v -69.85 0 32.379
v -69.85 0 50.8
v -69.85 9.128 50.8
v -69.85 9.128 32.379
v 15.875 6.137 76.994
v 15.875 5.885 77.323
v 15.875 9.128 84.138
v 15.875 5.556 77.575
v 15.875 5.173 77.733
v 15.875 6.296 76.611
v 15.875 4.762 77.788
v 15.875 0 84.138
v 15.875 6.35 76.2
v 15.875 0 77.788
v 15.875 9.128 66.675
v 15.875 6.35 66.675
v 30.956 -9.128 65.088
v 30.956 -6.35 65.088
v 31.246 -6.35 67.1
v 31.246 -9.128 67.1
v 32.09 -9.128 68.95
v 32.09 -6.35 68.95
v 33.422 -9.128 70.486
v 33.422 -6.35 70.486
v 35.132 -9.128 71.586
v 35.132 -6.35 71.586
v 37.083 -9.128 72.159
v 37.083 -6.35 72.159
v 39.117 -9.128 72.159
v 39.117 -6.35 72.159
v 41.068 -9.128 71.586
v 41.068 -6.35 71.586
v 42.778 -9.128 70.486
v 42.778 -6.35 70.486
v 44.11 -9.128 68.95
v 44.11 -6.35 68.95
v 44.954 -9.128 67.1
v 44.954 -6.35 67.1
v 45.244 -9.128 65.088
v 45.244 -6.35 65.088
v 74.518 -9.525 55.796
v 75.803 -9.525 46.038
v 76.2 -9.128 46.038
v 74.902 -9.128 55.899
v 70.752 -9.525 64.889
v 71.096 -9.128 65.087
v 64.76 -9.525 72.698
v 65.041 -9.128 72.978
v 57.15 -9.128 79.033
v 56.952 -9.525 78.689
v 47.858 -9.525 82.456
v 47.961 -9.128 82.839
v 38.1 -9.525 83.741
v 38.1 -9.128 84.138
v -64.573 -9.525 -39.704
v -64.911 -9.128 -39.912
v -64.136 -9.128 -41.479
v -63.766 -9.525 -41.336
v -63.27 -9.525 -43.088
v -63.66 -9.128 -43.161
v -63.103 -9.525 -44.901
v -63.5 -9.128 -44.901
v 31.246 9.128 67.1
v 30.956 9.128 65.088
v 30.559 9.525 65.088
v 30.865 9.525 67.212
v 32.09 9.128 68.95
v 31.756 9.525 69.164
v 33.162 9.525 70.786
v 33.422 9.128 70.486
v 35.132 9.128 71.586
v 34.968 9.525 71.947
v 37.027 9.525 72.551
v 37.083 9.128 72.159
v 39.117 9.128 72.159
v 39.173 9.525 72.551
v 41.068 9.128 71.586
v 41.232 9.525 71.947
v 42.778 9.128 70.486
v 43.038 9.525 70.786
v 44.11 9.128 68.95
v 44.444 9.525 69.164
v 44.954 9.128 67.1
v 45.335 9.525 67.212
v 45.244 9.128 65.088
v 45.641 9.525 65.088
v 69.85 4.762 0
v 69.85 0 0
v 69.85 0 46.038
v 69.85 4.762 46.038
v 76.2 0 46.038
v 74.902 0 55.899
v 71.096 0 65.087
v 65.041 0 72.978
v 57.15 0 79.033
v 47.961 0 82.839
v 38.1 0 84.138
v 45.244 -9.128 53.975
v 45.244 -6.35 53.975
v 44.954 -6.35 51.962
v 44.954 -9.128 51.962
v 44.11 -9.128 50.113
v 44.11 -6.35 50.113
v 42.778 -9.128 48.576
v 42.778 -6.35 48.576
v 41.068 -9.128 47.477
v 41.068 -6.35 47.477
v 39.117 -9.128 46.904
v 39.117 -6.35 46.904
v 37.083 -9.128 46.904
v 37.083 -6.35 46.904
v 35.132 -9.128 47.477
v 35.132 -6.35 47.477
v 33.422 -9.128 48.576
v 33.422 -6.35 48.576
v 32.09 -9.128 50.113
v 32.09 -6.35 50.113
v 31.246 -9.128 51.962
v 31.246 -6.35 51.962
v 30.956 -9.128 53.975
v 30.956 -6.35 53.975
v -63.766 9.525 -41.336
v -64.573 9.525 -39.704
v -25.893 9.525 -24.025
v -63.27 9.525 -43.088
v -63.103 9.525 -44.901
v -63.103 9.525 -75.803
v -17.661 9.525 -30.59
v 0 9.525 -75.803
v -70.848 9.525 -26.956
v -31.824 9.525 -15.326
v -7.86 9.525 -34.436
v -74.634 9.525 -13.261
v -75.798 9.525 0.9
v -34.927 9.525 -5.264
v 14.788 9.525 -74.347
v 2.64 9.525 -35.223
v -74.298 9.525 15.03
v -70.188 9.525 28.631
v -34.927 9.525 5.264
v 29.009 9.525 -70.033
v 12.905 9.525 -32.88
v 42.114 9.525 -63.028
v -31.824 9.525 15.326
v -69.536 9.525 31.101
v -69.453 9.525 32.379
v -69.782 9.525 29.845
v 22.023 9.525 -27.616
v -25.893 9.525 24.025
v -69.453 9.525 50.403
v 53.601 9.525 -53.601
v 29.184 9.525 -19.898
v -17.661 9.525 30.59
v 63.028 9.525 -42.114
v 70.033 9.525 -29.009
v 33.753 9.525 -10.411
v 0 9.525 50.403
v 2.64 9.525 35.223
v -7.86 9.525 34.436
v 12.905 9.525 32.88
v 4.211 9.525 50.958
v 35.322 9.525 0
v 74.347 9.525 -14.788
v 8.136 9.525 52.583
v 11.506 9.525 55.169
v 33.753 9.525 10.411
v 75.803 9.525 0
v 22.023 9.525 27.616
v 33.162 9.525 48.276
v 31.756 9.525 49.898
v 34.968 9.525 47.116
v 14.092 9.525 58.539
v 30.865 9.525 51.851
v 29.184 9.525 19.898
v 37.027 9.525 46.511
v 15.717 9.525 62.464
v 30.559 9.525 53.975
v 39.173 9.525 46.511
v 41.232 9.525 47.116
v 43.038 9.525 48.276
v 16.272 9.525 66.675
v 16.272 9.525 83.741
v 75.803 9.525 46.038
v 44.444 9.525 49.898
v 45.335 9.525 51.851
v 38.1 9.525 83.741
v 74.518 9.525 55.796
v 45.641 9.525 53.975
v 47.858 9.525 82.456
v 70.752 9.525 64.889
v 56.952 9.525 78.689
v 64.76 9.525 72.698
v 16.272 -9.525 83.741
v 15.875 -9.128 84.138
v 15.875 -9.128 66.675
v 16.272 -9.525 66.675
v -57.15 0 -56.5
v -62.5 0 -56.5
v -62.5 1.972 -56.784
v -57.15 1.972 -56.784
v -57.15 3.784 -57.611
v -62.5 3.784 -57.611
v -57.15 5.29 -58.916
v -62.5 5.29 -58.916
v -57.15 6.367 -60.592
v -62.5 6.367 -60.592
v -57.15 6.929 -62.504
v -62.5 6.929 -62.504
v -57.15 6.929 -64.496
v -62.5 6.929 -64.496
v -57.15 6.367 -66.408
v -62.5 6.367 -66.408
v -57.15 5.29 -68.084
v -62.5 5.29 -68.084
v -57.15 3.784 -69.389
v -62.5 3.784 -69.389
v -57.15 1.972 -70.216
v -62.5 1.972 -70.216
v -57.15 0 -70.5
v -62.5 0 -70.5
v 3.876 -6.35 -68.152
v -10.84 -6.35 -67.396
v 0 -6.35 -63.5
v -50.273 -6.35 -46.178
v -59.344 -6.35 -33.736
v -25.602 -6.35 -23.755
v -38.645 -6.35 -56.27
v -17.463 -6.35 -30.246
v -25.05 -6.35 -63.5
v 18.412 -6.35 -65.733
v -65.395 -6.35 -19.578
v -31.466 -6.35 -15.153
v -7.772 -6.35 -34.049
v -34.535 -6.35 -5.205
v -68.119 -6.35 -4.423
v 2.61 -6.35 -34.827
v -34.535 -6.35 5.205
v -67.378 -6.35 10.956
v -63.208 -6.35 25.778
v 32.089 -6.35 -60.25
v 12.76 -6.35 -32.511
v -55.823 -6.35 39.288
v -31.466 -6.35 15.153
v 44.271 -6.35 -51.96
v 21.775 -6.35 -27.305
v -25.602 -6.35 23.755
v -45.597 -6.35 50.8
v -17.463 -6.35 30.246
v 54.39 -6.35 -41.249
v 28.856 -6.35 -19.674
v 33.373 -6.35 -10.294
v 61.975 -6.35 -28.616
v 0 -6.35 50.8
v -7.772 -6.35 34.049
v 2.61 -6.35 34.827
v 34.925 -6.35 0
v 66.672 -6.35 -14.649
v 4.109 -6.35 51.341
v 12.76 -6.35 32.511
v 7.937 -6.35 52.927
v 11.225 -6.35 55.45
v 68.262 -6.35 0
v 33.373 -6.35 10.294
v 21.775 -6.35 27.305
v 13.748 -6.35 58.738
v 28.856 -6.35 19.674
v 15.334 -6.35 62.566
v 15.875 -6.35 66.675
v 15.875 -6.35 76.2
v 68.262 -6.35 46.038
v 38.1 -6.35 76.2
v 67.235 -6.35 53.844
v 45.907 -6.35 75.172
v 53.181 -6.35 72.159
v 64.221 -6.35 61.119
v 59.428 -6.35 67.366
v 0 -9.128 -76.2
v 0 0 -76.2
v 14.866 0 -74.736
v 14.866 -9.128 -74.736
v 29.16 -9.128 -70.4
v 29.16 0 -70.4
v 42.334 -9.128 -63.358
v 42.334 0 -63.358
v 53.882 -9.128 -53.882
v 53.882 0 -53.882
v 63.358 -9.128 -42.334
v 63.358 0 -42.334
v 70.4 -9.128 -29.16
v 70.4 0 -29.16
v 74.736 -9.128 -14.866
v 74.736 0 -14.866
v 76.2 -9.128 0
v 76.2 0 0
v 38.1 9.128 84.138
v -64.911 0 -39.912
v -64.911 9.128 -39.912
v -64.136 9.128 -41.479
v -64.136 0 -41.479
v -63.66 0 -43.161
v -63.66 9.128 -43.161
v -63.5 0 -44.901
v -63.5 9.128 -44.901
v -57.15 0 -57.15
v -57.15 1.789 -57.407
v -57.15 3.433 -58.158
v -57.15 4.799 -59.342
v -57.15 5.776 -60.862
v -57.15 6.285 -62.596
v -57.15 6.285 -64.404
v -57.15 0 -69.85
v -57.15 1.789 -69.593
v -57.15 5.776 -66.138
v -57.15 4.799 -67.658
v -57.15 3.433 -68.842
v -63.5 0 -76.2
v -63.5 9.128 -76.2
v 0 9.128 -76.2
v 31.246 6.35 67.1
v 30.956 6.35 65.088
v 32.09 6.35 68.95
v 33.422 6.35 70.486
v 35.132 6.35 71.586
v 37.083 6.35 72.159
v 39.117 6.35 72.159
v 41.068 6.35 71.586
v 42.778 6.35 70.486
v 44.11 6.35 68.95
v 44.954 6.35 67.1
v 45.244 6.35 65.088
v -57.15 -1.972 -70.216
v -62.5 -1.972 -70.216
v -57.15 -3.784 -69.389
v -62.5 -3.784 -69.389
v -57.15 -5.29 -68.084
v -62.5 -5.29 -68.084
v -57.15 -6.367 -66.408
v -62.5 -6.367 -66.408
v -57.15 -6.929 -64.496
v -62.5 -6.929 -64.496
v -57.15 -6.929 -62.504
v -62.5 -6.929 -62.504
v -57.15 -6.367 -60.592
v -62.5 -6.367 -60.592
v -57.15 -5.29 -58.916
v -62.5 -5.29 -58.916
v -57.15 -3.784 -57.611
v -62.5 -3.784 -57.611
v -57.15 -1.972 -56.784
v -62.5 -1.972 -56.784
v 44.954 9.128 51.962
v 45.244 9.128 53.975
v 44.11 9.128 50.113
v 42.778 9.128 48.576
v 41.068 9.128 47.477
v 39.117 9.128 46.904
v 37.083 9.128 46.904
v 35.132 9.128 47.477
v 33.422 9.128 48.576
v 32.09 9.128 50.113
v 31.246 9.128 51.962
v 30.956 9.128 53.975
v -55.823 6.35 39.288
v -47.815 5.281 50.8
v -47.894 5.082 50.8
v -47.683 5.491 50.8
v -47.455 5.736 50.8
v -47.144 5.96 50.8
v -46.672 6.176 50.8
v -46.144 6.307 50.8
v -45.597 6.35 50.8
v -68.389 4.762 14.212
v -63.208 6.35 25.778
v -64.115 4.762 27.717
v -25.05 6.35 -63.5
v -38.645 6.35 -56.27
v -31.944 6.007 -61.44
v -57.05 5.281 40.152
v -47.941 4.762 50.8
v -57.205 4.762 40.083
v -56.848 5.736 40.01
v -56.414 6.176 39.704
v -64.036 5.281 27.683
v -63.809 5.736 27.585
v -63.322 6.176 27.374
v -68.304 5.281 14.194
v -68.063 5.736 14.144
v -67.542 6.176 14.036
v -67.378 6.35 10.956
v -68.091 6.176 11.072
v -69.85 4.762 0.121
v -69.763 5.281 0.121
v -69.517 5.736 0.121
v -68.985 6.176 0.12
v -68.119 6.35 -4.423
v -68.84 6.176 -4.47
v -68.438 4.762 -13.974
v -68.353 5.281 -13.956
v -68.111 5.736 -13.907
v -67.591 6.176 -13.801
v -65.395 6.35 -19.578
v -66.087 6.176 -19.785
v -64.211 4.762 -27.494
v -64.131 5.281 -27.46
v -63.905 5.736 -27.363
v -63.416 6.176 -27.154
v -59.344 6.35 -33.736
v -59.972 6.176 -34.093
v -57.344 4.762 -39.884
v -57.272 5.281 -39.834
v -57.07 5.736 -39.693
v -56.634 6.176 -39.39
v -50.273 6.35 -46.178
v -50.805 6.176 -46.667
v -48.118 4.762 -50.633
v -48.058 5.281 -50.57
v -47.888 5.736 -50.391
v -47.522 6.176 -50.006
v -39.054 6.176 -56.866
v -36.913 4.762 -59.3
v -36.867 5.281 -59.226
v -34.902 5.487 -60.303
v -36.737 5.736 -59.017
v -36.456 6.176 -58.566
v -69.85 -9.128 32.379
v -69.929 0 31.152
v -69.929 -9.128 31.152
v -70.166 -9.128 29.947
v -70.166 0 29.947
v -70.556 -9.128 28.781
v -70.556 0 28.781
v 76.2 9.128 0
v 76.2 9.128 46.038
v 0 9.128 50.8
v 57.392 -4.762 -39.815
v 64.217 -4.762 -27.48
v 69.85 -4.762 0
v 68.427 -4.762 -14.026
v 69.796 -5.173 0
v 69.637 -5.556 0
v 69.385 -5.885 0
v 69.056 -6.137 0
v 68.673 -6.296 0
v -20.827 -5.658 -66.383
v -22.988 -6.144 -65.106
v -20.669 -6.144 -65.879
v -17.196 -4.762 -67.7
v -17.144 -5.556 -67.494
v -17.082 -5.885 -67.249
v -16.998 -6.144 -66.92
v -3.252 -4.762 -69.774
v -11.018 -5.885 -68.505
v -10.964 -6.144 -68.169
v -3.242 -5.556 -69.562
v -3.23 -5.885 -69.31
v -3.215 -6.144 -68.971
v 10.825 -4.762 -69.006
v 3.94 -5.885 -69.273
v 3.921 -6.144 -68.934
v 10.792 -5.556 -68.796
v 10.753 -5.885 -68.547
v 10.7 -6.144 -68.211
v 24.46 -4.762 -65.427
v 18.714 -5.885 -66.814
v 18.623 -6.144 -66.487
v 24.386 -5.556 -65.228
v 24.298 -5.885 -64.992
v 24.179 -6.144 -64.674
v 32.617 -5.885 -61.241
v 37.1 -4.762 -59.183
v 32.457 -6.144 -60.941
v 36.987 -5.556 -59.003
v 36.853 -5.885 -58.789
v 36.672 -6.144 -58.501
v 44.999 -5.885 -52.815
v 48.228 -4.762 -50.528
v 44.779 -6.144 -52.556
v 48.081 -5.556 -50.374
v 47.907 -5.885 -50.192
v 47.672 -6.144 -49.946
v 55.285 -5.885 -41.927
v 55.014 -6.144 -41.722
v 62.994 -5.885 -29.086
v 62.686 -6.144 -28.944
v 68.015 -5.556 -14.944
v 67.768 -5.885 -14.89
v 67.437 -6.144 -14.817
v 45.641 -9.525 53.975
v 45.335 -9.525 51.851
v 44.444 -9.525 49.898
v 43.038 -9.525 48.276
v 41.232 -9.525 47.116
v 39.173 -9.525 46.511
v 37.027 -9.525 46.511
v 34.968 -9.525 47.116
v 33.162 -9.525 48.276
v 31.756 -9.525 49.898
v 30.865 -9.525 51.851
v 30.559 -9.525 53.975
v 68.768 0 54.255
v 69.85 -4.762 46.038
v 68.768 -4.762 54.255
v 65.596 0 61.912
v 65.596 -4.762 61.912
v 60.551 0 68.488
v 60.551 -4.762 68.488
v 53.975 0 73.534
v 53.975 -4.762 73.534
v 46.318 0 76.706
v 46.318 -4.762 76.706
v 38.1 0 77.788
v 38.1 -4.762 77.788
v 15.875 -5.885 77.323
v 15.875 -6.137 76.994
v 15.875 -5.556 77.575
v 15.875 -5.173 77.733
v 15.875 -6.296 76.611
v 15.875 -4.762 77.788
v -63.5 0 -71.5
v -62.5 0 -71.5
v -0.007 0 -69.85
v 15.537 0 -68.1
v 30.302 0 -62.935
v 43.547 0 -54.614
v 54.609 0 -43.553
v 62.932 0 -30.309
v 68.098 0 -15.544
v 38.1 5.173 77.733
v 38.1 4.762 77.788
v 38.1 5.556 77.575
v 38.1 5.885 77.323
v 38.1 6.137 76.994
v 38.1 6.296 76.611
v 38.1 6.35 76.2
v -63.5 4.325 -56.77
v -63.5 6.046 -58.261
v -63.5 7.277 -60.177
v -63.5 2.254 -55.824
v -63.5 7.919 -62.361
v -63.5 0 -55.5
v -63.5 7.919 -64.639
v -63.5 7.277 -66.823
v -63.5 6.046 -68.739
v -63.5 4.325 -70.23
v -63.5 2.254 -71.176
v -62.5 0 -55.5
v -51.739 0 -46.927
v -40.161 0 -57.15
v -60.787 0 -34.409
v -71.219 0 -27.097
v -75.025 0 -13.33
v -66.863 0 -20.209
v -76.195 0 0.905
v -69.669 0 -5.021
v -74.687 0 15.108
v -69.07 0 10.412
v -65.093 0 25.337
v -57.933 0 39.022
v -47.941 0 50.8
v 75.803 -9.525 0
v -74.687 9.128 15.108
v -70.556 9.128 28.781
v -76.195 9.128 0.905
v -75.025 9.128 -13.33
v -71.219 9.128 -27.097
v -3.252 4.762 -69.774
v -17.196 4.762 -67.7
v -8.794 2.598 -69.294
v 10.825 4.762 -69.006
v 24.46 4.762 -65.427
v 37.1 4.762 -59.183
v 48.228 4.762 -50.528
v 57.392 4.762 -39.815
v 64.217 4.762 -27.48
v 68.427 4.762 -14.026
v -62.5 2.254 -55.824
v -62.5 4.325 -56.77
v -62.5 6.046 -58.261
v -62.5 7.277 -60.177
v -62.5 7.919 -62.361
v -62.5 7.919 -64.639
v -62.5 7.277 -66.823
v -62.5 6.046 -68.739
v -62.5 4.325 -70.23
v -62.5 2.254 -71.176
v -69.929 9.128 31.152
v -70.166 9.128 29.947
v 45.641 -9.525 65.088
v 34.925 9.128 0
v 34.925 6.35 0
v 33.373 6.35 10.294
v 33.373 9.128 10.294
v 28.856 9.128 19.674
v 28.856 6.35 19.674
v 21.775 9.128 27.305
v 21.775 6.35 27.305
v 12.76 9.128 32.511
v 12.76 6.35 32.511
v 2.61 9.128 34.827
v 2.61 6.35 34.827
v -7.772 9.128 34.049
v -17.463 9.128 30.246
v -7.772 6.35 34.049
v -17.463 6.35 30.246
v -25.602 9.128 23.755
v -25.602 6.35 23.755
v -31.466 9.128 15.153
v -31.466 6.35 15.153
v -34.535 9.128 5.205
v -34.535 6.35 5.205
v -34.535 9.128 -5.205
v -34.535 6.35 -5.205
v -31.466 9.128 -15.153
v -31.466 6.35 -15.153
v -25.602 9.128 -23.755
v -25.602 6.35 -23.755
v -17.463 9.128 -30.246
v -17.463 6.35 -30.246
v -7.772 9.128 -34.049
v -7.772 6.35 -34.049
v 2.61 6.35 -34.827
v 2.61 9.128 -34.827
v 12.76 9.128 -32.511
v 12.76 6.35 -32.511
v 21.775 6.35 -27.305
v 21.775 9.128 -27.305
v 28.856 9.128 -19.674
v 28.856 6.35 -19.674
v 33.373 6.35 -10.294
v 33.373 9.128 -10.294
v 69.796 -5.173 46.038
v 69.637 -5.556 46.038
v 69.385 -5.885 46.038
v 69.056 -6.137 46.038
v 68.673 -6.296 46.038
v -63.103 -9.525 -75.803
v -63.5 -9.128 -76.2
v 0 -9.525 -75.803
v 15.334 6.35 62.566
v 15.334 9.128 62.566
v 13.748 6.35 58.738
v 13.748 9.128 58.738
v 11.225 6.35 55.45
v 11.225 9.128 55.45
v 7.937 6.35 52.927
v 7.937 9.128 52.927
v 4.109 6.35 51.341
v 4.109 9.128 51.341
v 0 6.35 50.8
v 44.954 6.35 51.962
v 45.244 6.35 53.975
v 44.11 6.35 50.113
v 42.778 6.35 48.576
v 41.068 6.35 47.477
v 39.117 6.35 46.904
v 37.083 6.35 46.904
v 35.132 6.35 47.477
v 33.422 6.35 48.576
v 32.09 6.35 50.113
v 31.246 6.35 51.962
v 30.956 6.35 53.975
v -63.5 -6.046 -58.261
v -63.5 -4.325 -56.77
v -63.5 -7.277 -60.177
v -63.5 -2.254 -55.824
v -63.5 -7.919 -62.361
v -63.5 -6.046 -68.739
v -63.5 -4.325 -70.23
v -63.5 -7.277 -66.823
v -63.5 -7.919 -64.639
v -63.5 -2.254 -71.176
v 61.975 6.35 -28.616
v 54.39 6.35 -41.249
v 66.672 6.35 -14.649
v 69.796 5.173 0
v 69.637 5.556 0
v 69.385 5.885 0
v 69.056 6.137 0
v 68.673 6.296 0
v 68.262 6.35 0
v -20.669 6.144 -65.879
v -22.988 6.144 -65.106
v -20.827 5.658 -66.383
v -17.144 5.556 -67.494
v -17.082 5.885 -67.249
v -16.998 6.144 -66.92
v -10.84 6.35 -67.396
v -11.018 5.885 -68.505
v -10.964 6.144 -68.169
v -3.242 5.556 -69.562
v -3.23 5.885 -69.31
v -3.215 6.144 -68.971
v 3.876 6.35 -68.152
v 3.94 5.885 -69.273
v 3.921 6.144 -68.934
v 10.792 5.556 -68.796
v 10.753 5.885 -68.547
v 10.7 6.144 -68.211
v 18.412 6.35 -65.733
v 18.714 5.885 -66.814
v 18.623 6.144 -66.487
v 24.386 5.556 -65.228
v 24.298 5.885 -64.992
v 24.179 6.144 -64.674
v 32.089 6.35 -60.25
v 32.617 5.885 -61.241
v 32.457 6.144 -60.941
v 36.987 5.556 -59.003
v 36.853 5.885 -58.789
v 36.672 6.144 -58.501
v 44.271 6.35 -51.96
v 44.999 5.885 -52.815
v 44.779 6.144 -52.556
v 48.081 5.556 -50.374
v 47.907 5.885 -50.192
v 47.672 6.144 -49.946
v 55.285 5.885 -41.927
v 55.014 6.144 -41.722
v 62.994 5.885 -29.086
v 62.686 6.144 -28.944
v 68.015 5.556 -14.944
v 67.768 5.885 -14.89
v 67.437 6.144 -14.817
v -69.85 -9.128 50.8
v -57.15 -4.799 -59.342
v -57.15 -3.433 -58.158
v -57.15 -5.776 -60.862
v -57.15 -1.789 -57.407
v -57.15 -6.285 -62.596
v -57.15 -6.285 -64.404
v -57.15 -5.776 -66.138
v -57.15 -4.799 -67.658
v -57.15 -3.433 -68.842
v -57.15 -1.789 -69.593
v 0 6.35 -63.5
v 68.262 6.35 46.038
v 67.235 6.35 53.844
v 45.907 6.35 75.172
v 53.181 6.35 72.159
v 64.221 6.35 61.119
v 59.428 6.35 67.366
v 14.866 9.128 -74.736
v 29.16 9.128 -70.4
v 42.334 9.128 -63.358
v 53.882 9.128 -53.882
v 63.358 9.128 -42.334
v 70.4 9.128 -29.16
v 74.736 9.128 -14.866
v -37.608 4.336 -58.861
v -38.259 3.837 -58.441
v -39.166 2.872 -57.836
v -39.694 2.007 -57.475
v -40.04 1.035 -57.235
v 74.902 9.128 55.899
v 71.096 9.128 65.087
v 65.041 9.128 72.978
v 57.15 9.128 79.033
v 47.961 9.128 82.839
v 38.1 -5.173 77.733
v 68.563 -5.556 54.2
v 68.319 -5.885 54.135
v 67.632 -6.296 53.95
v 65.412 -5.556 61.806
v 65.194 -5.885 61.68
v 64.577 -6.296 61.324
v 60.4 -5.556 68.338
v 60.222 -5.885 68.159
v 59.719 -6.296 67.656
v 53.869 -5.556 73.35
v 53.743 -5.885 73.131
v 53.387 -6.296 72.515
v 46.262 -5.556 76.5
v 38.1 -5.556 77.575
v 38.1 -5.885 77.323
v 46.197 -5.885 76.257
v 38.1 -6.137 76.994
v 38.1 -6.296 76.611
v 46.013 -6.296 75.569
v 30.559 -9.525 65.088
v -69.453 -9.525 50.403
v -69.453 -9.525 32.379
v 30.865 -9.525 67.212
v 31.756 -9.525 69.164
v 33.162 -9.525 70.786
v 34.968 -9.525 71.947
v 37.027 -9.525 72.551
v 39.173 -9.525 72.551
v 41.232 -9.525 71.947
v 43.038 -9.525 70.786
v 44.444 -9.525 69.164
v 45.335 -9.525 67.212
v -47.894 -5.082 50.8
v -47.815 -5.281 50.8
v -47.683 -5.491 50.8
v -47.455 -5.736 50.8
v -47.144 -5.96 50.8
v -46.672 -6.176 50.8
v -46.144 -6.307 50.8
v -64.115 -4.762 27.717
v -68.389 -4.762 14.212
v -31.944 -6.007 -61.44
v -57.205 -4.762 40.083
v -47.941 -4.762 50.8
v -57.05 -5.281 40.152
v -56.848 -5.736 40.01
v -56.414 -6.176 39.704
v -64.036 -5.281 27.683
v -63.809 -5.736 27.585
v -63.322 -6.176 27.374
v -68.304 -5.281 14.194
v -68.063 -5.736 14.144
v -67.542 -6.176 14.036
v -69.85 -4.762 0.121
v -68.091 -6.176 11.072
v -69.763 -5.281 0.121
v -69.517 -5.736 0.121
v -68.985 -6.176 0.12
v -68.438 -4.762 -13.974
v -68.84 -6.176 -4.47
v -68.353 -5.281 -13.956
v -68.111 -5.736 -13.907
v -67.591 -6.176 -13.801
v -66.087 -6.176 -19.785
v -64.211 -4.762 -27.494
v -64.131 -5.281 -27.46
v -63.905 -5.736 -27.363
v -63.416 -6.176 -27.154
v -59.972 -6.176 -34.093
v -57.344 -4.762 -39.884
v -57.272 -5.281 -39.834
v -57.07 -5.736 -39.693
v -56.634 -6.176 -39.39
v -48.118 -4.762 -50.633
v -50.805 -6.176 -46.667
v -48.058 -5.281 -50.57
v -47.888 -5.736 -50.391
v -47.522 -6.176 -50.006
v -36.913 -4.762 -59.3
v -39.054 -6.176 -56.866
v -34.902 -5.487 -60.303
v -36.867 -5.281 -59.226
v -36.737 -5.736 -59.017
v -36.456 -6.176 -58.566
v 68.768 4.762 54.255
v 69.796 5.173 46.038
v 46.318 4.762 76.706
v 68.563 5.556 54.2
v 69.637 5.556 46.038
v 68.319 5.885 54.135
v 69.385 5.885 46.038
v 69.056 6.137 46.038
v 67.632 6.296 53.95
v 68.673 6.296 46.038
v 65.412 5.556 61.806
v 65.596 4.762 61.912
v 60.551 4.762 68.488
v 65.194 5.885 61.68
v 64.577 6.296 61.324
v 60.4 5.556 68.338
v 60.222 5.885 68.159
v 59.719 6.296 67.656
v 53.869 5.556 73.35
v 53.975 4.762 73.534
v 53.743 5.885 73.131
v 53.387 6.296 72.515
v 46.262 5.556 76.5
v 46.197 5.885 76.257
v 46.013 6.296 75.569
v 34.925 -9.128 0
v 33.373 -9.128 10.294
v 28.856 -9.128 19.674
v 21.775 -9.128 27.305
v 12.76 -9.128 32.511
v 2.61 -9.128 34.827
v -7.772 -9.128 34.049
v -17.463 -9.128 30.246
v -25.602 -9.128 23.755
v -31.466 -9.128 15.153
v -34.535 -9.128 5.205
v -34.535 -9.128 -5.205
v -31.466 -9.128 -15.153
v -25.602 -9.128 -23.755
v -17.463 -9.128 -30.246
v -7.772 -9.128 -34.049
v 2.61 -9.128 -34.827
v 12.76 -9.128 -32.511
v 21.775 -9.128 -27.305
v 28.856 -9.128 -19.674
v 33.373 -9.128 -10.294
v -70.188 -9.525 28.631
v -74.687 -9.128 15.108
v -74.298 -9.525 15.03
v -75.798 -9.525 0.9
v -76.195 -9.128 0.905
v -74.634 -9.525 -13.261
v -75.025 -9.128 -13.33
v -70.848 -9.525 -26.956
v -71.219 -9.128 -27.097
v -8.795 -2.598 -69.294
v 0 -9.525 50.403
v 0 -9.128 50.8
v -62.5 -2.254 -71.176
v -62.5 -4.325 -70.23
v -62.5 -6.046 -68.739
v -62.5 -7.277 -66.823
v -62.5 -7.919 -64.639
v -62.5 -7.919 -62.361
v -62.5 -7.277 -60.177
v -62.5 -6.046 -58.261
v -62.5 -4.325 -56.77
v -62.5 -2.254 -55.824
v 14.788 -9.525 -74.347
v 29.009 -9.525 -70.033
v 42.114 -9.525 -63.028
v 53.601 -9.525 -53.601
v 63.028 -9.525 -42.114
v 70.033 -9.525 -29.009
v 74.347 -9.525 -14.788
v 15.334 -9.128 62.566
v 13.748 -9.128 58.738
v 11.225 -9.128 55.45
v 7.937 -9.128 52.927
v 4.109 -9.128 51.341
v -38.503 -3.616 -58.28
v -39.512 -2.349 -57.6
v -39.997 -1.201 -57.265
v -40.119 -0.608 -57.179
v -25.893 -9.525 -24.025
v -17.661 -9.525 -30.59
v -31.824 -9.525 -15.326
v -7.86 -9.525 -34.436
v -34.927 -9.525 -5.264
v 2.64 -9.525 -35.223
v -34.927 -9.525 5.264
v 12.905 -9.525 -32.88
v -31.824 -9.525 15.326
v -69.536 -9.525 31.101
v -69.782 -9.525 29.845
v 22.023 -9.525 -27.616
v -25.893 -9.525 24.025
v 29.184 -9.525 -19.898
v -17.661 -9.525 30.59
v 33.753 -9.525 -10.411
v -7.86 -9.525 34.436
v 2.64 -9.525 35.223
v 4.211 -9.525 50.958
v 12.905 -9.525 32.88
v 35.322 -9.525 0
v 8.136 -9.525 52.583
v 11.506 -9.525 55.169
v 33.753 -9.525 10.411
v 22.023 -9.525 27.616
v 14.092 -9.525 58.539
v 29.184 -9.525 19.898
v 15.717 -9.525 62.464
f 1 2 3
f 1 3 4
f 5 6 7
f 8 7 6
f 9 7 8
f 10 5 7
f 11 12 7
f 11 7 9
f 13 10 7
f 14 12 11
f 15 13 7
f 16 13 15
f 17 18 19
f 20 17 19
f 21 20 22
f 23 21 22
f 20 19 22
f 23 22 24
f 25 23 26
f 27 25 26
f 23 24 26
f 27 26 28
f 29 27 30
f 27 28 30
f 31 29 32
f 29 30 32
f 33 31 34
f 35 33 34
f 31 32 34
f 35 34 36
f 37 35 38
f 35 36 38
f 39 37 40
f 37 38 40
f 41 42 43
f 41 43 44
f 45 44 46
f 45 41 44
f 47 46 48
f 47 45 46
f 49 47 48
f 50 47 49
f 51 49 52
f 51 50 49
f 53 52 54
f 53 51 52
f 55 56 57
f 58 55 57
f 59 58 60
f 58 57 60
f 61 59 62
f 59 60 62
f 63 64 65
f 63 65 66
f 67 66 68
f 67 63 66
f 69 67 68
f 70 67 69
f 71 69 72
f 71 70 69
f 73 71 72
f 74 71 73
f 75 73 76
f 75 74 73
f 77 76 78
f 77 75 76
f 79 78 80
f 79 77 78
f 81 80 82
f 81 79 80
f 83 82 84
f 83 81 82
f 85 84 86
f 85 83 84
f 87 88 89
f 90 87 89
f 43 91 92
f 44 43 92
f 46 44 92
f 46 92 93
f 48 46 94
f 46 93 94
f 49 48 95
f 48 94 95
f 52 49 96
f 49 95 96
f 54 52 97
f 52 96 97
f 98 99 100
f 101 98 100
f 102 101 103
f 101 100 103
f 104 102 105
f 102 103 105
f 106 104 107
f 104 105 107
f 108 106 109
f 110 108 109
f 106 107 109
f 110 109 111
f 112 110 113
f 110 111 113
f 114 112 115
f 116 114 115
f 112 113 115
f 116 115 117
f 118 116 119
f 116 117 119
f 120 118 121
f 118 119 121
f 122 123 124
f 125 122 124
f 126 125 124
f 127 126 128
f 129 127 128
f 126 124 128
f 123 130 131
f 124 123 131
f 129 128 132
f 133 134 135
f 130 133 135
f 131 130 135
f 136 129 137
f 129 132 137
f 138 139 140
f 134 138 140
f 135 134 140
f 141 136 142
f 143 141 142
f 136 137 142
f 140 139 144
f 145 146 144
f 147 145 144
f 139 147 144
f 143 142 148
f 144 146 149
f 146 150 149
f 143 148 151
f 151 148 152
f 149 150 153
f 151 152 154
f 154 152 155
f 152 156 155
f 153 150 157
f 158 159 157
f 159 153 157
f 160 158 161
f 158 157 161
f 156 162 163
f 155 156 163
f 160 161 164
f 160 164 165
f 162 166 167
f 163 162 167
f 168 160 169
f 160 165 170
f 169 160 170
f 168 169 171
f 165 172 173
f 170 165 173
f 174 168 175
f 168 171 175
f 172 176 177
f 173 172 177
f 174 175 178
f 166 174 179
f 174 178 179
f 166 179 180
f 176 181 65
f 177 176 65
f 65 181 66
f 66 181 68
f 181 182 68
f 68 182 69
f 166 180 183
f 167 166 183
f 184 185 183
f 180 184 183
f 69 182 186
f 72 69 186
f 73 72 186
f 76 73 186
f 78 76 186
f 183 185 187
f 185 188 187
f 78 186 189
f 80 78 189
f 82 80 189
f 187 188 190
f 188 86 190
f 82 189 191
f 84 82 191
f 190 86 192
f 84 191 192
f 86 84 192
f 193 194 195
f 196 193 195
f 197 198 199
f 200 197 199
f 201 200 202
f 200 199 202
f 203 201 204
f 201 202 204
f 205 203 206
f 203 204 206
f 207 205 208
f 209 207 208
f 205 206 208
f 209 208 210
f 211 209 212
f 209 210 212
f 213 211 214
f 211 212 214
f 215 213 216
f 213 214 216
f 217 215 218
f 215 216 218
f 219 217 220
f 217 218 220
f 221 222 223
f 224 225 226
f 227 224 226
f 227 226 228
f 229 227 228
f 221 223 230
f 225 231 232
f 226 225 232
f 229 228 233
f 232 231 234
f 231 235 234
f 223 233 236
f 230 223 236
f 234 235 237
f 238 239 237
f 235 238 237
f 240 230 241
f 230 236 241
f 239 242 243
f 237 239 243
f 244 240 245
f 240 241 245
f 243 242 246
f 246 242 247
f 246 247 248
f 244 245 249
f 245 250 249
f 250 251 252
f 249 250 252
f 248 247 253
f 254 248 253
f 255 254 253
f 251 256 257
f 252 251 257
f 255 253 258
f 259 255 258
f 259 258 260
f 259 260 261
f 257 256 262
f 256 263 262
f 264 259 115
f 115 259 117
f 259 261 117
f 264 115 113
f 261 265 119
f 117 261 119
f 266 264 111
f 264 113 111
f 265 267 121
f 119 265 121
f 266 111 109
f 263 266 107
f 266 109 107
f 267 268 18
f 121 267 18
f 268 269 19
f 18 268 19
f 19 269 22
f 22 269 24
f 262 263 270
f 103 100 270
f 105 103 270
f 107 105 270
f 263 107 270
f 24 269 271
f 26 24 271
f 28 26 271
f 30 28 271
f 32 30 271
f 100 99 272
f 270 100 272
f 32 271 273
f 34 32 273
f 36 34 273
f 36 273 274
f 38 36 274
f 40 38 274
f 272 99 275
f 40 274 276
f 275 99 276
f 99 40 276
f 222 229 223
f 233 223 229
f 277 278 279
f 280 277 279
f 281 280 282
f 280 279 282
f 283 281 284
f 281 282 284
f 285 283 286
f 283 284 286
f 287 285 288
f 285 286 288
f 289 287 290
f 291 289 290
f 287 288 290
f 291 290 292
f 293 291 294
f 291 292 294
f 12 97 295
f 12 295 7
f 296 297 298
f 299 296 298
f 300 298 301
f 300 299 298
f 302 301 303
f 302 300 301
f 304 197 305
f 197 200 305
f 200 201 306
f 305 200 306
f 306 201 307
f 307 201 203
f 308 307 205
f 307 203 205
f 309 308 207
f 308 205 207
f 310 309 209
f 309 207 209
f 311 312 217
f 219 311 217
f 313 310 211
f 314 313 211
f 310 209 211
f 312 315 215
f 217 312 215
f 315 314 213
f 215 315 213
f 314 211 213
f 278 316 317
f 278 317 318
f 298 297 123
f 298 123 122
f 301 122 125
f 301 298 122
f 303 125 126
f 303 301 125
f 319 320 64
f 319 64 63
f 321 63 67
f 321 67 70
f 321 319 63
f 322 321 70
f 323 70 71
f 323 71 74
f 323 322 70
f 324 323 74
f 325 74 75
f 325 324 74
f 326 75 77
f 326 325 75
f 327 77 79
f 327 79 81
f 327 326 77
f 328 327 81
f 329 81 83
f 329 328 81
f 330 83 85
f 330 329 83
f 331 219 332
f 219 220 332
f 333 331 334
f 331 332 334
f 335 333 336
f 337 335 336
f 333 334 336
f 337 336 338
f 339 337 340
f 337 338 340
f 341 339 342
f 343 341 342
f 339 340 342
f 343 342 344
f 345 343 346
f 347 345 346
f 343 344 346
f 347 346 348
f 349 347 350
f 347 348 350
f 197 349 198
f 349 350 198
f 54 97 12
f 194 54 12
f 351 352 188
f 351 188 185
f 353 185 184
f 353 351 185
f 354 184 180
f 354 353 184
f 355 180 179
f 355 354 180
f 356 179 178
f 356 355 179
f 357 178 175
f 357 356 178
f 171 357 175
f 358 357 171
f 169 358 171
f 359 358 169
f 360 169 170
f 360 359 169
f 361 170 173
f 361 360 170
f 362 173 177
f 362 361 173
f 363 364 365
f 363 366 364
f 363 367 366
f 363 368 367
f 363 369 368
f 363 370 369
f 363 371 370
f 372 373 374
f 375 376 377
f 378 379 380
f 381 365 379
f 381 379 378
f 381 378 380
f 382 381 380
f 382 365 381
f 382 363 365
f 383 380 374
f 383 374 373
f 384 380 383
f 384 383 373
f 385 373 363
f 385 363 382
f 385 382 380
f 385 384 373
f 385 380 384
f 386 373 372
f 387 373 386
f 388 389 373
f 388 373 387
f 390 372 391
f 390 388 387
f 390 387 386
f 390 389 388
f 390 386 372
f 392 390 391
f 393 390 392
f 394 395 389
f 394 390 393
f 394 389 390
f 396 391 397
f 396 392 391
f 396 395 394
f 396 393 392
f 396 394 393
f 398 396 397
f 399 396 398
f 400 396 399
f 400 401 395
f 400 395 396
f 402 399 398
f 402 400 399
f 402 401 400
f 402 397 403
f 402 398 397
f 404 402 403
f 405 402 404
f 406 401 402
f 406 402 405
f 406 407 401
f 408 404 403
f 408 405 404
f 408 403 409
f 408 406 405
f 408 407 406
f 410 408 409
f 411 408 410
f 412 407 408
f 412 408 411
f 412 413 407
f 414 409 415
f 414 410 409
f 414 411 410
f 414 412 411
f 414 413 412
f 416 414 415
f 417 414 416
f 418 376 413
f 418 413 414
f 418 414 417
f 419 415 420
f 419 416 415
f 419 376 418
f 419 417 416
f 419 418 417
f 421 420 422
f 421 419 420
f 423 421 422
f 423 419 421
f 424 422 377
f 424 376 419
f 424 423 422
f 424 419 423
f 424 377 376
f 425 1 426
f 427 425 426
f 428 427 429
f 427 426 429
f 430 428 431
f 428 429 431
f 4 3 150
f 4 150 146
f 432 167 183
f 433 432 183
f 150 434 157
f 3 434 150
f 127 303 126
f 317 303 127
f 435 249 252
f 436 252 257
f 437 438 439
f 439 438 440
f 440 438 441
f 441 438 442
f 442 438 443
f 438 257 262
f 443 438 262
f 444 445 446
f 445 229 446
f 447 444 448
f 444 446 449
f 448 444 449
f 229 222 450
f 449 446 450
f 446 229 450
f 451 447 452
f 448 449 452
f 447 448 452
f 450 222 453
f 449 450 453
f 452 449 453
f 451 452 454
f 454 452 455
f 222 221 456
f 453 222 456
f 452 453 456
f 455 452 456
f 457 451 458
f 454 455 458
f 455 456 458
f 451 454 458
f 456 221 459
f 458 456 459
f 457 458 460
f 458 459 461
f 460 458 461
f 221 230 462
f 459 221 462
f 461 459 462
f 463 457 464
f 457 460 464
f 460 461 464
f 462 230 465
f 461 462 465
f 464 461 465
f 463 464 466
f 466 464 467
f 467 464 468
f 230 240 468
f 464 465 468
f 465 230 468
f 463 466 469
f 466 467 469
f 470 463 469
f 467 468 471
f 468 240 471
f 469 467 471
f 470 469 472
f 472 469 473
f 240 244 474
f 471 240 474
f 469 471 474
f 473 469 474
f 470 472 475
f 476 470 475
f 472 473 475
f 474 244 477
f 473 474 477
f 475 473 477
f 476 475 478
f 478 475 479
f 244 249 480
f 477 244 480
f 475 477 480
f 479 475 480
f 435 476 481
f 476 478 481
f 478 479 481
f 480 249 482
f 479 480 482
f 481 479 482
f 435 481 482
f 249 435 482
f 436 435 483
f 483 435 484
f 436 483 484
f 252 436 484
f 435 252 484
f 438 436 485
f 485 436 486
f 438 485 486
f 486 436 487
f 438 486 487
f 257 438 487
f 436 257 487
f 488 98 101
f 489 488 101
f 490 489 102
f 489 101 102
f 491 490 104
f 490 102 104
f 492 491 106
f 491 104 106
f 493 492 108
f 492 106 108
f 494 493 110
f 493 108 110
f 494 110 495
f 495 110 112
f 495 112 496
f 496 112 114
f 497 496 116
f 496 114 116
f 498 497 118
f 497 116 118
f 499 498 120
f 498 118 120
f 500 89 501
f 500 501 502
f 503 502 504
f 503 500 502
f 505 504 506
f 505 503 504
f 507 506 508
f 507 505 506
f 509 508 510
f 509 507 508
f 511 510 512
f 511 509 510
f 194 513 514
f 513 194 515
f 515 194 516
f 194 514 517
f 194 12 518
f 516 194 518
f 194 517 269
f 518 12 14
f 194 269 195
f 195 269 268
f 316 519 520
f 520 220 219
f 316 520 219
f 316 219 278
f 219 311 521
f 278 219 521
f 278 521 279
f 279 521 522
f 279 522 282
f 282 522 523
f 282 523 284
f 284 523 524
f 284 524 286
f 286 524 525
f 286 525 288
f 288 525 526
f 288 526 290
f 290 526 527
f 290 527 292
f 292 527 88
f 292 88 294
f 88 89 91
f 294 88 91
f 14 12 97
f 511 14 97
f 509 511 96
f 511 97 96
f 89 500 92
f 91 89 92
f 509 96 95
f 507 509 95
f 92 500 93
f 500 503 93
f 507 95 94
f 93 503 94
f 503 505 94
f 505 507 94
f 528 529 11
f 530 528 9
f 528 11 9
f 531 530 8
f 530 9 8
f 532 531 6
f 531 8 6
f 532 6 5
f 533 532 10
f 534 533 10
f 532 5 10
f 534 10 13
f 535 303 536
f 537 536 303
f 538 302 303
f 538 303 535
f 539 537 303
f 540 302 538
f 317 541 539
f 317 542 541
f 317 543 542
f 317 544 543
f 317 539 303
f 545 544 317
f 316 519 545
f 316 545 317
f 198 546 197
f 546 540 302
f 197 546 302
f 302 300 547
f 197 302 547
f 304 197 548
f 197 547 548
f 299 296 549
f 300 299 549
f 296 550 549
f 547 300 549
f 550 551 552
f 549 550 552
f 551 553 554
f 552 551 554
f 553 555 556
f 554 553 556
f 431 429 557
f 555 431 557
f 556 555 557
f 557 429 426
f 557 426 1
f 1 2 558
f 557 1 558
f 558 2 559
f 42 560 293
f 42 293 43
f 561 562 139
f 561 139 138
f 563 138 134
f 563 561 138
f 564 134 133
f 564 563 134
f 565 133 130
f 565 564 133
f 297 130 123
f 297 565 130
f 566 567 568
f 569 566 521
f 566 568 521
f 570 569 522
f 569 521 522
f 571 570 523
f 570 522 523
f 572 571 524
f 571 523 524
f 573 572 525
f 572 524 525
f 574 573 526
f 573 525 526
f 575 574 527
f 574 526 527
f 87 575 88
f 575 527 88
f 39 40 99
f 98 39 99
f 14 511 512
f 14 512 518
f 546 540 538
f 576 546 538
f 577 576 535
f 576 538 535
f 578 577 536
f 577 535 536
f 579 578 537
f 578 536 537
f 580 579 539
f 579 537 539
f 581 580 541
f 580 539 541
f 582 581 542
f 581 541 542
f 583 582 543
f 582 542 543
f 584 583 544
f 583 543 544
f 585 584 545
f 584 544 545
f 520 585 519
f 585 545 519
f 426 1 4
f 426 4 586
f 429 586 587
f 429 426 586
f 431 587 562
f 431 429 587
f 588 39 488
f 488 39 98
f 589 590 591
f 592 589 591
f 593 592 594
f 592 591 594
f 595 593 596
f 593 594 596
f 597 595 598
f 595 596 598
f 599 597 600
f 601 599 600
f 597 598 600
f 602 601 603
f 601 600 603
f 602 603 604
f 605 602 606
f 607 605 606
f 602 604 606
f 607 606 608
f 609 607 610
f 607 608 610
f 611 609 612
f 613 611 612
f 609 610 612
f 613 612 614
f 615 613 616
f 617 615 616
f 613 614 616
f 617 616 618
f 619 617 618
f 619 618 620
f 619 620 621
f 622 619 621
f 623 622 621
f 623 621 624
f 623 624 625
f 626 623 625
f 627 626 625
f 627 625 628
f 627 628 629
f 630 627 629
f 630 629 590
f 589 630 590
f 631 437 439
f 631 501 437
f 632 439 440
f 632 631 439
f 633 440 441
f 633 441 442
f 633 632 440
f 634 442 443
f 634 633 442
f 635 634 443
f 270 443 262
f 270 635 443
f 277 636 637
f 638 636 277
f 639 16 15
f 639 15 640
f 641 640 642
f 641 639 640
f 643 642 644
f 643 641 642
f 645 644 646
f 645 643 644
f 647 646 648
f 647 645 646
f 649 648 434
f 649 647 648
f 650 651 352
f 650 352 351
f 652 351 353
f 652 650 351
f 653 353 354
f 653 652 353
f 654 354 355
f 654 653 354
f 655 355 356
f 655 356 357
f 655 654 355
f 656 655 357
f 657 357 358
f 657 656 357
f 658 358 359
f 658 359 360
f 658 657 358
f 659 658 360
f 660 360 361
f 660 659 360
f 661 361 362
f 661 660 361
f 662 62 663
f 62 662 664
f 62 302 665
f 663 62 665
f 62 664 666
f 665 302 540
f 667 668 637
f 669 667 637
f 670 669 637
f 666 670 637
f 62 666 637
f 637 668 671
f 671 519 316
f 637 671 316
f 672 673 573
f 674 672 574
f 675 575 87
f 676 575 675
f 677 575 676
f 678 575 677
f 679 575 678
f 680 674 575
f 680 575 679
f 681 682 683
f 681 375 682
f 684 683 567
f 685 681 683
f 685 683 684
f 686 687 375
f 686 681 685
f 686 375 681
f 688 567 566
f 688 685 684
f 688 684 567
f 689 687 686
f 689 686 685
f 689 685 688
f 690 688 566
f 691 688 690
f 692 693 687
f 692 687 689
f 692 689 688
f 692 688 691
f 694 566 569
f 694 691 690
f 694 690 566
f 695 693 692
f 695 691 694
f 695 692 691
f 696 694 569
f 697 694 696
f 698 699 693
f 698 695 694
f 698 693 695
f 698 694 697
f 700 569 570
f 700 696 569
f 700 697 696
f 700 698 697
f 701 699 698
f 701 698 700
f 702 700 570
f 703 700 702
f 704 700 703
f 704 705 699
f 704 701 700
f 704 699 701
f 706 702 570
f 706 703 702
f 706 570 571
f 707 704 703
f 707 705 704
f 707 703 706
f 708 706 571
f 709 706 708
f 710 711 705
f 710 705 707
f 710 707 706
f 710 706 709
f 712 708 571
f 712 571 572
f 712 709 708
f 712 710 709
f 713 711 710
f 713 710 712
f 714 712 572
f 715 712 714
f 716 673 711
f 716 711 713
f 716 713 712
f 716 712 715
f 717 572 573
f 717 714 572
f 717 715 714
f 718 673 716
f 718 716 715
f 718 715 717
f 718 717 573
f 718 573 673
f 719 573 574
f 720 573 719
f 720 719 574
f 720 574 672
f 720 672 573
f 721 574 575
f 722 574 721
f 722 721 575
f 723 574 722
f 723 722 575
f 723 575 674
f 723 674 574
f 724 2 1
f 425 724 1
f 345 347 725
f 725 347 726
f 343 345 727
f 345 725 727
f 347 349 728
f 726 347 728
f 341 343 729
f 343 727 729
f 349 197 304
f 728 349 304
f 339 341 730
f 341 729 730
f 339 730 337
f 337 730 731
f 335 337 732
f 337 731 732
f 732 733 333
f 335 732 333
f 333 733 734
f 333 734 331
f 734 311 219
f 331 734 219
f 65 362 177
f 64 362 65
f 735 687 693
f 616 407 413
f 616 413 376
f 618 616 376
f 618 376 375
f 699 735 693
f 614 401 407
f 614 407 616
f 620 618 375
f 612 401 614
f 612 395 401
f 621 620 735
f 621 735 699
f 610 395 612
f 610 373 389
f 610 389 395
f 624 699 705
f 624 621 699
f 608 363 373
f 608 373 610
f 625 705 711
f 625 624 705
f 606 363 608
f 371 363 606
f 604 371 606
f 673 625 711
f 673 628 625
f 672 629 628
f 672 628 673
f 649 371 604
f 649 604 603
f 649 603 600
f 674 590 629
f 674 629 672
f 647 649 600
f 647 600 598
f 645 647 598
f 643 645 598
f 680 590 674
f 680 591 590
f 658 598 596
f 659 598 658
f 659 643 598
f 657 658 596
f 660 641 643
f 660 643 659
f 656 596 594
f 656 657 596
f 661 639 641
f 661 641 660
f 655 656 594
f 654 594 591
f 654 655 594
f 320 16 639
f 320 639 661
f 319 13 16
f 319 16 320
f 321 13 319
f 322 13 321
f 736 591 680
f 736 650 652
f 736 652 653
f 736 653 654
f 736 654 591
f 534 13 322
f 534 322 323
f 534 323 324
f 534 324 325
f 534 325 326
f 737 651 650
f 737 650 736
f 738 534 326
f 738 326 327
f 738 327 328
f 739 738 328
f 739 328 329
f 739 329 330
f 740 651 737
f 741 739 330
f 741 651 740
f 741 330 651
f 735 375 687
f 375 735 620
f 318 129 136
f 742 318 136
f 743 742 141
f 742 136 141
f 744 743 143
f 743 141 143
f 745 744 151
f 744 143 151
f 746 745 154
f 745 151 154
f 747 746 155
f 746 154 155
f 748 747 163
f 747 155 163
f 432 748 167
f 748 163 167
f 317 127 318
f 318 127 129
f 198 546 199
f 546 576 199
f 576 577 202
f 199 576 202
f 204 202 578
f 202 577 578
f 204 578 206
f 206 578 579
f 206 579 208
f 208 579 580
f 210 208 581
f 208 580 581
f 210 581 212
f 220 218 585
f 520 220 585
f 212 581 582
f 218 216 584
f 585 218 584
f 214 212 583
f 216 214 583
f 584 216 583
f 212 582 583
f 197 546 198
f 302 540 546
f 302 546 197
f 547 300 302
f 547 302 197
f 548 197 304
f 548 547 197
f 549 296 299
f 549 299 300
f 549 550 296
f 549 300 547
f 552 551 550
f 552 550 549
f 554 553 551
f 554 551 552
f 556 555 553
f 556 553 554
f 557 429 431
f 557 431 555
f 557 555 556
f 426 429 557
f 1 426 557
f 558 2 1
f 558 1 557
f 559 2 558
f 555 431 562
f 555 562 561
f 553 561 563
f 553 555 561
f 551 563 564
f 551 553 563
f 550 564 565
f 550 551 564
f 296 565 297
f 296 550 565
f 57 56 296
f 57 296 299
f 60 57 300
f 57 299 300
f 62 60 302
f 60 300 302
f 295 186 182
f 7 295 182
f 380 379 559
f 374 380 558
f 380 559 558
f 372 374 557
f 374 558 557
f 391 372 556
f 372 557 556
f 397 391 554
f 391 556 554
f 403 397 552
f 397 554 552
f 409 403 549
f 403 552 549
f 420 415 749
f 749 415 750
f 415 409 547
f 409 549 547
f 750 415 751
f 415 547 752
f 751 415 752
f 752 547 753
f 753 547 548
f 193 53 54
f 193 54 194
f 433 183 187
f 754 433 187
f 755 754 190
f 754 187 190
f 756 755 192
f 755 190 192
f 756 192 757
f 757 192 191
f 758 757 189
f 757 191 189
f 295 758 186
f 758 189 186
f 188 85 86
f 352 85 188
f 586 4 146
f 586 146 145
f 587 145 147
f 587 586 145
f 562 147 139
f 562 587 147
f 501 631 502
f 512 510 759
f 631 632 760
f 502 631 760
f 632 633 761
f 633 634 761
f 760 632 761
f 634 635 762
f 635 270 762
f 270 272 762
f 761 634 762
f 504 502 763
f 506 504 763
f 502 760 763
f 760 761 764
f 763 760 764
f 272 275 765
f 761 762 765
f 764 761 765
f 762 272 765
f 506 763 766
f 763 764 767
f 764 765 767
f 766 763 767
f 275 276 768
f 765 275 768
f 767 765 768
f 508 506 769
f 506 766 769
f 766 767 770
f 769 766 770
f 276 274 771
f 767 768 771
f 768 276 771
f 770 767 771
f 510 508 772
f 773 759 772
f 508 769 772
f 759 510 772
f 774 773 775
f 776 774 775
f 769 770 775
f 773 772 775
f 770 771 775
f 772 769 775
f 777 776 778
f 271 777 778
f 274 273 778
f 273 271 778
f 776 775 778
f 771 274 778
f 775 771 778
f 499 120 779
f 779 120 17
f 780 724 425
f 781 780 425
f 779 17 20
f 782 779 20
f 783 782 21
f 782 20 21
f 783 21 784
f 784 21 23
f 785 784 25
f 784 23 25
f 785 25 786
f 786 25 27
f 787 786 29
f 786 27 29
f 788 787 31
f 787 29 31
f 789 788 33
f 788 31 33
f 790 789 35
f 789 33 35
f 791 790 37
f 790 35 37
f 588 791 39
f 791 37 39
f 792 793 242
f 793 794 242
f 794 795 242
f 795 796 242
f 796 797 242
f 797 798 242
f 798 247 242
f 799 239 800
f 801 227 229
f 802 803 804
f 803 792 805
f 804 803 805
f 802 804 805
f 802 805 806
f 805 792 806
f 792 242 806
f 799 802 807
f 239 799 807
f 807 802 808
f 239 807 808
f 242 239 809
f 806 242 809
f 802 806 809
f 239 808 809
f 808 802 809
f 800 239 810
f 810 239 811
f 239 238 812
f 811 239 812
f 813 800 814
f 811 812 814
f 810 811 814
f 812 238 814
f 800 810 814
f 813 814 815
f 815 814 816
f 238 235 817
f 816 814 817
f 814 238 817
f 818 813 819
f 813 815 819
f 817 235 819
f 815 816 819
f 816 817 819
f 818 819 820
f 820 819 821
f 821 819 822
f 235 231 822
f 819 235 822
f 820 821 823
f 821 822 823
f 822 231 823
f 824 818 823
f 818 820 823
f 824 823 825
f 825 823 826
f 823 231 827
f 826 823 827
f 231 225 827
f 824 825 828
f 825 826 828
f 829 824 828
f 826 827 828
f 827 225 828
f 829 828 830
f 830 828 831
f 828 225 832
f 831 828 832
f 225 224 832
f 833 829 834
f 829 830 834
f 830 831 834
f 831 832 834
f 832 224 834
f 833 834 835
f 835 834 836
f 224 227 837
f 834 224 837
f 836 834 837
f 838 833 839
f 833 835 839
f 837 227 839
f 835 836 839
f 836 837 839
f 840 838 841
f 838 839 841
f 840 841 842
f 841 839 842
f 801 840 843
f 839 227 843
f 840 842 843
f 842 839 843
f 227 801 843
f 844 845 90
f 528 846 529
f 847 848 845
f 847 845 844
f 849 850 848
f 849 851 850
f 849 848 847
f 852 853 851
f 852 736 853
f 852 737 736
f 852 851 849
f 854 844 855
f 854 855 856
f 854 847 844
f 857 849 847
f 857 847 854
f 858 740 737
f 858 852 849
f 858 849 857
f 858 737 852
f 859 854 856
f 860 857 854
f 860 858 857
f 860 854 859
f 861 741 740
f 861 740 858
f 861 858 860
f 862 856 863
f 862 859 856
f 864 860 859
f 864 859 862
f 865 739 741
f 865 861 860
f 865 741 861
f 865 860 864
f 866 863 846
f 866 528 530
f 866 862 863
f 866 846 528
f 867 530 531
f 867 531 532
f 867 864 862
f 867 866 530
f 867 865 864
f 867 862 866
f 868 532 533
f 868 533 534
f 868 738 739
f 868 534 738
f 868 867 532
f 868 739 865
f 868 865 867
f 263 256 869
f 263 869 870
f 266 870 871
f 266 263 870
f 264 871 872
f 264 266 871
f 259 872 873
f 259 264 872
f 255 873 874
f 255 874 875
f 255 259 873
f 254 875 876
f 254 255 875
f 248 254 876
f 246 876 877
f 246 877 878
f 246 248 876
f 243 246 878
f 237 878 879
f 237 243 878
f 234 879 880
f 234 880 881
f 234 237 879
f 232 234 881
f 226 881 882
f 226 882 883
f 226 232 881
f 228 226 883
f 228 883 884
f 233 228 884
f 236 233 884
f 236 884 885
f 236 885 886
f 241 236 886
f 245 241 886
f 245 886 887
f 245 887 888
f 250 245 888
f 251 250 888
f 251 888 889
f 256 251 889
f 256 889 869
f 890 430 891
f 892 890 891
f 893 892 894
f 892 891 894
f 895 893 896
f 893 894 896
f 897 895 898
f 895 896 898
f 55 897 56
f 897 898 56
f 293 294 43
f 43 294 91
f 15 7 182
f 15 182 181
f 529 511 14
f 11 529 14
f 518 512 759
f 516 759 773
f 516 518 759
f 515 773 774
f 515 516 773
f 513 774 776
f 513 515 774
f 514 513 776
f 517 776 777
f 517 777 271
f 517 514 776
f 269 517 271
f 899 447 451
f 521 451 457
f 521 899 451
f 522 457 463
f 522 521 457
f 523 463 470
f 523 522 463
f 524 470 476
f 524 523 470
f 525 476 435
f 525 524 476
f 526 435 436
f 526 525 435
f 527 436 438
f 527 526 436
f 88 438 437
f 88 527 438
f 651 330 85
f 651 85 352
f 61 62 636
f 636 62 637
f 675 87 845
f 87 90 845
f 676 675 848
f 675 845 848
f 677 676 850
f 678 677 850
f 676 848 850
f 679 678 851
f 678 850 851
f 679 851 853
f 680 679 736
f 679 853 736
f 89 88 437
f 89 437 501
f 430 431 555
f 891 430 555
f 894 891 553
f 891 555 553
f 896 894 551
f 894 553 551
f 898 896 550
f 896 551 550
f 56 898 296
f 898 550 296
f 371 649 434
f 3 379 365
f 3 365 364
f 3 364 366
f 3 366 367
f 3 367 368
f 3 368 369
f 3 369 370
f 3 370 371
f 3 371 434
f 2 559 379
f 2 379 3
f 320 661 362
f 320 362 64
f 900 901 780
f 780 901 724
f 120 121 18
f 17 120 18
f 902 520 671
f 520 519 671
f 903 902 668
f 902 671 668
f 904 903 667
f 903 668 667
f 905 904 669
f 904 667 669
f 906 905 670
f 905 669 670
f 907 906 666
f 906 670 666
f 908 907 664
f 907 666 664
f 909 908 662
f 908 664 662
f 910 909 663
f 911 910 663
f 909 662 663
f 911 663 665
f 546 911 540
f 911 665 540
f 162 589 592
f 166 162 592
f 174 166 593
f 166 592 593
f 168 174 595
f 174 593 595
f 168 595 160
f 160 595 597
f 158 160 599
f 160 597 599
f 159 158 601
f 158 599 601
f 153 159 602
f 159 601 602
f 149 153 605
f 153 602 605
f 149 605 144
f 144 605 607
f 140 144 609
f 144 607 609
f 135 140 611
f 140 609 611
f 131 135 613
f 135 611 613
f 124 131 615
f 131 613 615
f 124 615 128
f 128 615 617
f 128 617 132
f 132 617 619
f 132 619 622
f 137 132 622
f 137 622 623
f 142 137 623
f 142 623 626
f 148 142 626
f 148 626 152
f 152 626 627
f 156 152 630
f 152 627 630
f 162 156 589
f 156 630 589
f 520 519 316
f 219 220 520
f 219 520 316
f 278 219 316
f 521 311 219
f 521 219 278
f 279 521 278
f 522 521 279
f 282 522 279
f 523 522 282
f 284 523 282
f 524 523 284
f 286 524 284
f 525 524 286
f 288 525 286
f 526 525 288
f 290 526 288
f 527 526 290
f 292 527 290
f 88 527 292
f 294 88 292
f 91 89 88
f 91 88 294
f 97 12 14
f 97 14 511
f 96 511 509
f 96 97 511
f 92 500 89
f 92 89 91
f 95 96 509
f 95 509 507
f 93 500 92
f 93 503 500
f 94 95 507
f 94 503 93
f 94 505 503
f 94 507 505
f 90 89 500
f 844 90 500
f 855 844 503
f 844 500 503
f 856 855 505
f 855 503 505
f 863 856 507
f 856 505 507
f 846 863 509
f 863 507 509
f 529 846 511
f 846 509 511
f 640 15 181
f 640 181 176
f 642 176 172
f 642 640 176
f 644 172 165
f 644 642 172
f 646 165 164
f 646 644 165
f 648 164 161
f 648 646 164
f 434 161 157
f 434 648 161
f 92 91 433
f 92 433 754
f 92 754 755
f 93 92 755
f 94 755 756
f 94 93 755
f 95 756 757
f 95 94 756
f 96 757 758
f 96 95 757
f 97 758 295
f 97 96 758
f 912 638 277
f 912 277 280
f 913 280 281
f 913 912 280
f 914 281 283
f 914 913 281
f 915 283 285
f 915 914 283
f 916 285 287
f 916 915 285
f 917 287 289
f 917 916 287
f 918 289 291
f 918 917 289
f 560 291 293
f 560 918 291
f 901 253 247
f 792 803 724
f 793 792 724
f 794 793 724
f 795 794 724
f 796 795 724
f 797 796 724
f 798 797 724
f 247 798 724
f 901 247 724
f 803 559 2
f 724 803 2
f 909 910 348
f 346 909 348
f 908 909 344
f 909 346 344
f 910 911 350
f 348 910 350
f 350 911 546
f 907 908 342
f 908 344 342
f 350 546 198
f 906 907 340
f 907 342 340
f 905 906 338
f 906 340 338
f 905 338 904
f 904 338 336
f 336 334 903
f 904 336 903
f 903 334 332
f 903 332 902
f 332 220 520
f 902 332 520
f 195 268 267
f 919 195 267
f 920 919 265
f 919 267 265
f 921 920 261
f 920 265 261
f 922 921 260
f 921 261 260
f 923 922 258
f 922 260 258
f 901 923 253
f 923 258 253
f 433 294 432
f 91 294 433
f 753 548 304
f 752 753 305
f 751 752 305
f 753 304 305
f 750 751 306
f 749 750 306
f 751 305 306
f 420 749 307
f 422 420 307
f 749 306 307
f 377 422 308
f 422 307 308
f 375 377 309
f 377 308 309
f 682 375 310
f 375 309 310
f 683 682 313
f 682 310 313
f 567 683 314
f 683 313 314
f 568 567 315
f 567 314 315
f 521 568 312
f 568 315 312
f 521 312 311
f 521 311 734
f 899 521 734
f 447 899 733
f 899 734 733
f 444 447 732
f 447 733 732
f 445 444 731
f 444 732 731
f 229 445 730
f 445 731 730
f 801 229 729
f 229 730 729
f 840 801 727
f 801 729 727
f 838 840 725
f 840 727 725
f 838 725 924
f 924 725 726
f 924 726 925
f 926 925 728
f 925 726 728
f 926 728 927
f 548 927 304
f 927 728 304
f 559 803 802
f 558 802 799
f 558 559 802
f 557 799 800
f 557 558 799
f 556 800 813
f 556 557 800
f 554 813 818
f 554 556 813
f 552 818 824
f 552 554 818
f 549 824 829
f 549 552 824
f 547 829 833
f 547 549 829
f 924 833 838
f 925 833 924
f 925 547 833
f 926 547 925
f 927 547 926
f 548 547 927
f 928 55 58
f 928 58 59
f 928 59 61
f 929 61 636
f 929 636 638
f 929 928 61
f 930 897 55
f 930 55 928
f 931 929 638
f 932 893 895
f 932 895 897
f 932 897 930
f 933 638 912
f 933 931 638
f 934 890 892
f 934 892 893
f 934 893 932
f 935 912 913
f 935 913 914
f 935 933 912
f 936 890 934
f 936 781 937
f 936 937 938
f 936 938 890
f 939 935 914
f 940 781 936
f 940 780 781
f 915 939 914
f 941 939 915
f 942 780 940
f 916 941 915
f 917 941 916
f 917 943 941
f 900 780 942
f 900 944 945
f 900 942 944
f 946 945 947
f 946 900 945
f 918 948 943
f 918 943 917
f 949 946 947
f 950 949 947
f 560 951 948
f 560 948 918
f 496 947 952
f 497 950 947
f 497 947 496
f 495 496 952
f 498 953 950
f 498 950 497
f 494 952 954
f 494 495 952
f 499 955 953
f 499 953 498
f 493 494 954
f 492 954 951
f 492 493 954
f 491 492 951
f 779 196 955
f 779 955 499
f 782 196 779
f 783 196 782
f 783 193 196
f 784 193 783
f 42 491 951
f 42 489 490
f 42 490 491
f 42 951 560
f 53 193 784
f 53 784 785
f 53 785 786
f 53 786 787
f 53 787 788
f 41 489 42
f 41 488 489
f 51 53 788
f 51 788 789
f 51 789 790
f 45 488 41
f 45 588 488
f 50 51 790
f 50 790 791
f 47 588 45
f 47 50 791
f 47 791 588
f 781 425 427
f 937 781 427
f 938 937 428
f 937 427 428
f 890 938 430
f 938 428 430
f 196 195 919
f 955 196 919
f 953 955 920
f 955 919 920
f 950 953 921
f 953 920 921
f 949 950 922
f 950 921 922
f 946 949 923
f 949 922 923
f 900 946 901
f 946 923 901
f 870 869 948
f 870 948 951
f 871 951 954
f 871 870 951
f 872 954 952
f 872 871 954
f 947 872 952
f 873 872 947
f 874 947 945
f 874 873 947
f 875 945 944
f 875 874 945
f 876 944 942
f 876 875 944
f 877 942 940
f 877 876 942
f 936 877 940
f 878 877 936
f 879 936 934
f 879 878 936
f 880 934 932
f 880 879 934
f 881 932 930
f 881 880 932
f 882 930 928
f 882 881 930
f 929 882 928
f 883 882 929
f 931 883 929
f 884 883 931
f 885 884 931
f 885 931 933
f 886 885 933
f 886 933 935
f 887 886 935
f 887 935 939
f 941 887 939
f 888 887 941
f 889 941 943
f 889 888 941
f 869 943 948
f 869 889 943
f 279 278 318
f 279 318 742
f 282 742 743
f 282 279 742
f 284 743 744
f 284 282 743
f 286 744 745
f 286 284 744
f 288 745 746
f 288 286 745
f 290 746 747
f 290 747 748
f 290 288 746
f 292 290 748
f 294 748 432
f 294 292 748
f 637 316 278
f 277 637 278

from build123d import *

# Parameters (mm, degrees)
F2_DEPTH = 6.35
F3_R     = 1.5875
F0_R     = 34.925
F4_DEPTH = 9.525
F7_SIZE  = 0.396875


with BuildPart() as f2:
    # F1 (on Front) → F2 (new body)
    with BuildSketch(Plane.XZ):
        with BuildLine():
            Line((0, 77.7875), (0, 69.85))
            ThreePointArc((0, 69.85), (-49.391409, -49.391409), (69.85, 0))
            Line((69.85, 0), (69.85, 46.0375))
            ThreePointArc((69.85, 46.0375), (60.55064, 68.48814), (38.1, 77.7875))
            Line((38.1, 77.7875), (0, 77.7875))
        make_face()
    extrude(amount=F2_DEPTH)

    # F3
    f3_edges = [f2.edges().sort_by_distance(p)[0] for p in [
        (60.55064, -6.35, 68.48814),
    ]]
    fillet(f3_edges, radius=F3_R)


with BuildPart() as f4:
    # F0 (on Front) → F4 (new body)
    with BuildSketch(Plane.XZ):
        with BuildLine():
            Line((-63.5, -76.2), (0, -76.2))
            ThreePointArc((0, -76.2), (53.881537, -53.881537), (76.2, 0))
            Line((76.2, 0), (76.2, 46.0375))
            ThreePointArc((76.2, 46.0375), (65.040768, 72.978268), (38.1, 84.1375))
            Line((38.1, 84.1375), (15.875, 84.1375))
            Line((15.875, 84.1375), (15.875, 66.675))
            ThreePointArc((15.875, 66.675), (11.22532, 55.44968), (0, 50.8))
            Line((0, 50.8), (-69.85, 50.8))
            Line((-69.85, 50.8), (-69.85, 32.378774))
            ThreePointArc((-69.85, 32.378774), (-70.028053, 30.545687), (-70.555556, 28.781132))
            ThreePointArc((-70.555556, 28.781132), (-75.944056, -6.240223), (-64.911111, -39.912249))
            ThreePointArc((-64.911111, -39.912249), (-63.859564, -42.308904), (-63.5, -44.901281))
            Line((-63.5, -44.901281), (-63.5, -76.2))
        make_face()
        Circle(F0_R, mode=Mode.SUBTRACT)
        with BuildLine():
            ThreePointArc((45.24375, 53.975), (38.1, 46.83125), (30.95625, 53.975))
            Line((30.95625, 53.975), (30.95625, 65.0875))
            ThreePointArc((30.95625, 65.0875), (38.1, 72.23125), (45.24375, 65.0875))
            Line((45.24375, 65.0875), (45.24375, 53.975))
        make_face(mode=Mode.SUBTRACT)
    extrude(amount=F4_DEPTH)

    # F5: cut F2
    add(f2.part, mode=Mode.SUBTRACT)

    # F7
    f7_edges = [f4.edges().sort_by_distance(p)[0] for p in [
        (-63.859564, -9.525, -42.308904),
        (-63.5, -9.525, -60.55064),
        (-31.75, -9.525, -76.2),
        (53.881537, -9.525, -53.881537),
        (76.2, -9.525, 23.01875),
        (65.040768, -9.525, 72.978268),
        (26.9875, -9.525, 84.1375),
        (15.875, -9.525, 75.40625),
        (11.22532, -9.525, 55.44968),
        (-34.925, -9.525, 50.8),
        (-69.85, -9.525, 41.589387),
        (-70.028053, -9.525, 30.545687),
        (-75.944056, -9.525, -6.240223),
        (-34.925, -9.525, 0),
        (38.1, -9.525, 72.23125),
        (45.24375, -9.525, 59.53125),
        (38.1, -9.525, 46.83125),
        (30.95625, -9.525, 59.53125),
    ]]
    chamfer(f7_edges, length=F7_SIZE)


with BuildPart() as f6_1:
    # F6: instance of F4
    add(f4.part.mirror(Plane(origin=(-4.823836, 0, -16.021516), x_dir=(1, 0, 0), z_dir=(0, 1, 0))))


with BuildPart() as f9_tool:
    # F8 (on Front) → F9 (revolve)
    with BuildSketch(Plane.XZ):
        Polygon((-63.5, -63.5), (0, -63.5), (0, -57.15), (-57.15, -57.15), (-57.15, -56.5), (-62.5, -56.5), (-62.5, -55.5), (-63.5, -55.5), align=None)
    revolve(axis=Axis((-38.34922, 0, -63.5), (-1, 0, 0)))


with BuildPart() as f4_1:
    add(f4.part)

    # F9: cut by f9_tool
    add(f9_tool.part, mode=Mode.SUBTRACT)


with BuildPart() as f6_1_1:
    add(f6_1.part)

    # F9: cut by f9_tool
    add(f9_tool.part, mode=Mode.SUBTRACT)


solid = Compound([f4_1.part, f6_1_1.part])
